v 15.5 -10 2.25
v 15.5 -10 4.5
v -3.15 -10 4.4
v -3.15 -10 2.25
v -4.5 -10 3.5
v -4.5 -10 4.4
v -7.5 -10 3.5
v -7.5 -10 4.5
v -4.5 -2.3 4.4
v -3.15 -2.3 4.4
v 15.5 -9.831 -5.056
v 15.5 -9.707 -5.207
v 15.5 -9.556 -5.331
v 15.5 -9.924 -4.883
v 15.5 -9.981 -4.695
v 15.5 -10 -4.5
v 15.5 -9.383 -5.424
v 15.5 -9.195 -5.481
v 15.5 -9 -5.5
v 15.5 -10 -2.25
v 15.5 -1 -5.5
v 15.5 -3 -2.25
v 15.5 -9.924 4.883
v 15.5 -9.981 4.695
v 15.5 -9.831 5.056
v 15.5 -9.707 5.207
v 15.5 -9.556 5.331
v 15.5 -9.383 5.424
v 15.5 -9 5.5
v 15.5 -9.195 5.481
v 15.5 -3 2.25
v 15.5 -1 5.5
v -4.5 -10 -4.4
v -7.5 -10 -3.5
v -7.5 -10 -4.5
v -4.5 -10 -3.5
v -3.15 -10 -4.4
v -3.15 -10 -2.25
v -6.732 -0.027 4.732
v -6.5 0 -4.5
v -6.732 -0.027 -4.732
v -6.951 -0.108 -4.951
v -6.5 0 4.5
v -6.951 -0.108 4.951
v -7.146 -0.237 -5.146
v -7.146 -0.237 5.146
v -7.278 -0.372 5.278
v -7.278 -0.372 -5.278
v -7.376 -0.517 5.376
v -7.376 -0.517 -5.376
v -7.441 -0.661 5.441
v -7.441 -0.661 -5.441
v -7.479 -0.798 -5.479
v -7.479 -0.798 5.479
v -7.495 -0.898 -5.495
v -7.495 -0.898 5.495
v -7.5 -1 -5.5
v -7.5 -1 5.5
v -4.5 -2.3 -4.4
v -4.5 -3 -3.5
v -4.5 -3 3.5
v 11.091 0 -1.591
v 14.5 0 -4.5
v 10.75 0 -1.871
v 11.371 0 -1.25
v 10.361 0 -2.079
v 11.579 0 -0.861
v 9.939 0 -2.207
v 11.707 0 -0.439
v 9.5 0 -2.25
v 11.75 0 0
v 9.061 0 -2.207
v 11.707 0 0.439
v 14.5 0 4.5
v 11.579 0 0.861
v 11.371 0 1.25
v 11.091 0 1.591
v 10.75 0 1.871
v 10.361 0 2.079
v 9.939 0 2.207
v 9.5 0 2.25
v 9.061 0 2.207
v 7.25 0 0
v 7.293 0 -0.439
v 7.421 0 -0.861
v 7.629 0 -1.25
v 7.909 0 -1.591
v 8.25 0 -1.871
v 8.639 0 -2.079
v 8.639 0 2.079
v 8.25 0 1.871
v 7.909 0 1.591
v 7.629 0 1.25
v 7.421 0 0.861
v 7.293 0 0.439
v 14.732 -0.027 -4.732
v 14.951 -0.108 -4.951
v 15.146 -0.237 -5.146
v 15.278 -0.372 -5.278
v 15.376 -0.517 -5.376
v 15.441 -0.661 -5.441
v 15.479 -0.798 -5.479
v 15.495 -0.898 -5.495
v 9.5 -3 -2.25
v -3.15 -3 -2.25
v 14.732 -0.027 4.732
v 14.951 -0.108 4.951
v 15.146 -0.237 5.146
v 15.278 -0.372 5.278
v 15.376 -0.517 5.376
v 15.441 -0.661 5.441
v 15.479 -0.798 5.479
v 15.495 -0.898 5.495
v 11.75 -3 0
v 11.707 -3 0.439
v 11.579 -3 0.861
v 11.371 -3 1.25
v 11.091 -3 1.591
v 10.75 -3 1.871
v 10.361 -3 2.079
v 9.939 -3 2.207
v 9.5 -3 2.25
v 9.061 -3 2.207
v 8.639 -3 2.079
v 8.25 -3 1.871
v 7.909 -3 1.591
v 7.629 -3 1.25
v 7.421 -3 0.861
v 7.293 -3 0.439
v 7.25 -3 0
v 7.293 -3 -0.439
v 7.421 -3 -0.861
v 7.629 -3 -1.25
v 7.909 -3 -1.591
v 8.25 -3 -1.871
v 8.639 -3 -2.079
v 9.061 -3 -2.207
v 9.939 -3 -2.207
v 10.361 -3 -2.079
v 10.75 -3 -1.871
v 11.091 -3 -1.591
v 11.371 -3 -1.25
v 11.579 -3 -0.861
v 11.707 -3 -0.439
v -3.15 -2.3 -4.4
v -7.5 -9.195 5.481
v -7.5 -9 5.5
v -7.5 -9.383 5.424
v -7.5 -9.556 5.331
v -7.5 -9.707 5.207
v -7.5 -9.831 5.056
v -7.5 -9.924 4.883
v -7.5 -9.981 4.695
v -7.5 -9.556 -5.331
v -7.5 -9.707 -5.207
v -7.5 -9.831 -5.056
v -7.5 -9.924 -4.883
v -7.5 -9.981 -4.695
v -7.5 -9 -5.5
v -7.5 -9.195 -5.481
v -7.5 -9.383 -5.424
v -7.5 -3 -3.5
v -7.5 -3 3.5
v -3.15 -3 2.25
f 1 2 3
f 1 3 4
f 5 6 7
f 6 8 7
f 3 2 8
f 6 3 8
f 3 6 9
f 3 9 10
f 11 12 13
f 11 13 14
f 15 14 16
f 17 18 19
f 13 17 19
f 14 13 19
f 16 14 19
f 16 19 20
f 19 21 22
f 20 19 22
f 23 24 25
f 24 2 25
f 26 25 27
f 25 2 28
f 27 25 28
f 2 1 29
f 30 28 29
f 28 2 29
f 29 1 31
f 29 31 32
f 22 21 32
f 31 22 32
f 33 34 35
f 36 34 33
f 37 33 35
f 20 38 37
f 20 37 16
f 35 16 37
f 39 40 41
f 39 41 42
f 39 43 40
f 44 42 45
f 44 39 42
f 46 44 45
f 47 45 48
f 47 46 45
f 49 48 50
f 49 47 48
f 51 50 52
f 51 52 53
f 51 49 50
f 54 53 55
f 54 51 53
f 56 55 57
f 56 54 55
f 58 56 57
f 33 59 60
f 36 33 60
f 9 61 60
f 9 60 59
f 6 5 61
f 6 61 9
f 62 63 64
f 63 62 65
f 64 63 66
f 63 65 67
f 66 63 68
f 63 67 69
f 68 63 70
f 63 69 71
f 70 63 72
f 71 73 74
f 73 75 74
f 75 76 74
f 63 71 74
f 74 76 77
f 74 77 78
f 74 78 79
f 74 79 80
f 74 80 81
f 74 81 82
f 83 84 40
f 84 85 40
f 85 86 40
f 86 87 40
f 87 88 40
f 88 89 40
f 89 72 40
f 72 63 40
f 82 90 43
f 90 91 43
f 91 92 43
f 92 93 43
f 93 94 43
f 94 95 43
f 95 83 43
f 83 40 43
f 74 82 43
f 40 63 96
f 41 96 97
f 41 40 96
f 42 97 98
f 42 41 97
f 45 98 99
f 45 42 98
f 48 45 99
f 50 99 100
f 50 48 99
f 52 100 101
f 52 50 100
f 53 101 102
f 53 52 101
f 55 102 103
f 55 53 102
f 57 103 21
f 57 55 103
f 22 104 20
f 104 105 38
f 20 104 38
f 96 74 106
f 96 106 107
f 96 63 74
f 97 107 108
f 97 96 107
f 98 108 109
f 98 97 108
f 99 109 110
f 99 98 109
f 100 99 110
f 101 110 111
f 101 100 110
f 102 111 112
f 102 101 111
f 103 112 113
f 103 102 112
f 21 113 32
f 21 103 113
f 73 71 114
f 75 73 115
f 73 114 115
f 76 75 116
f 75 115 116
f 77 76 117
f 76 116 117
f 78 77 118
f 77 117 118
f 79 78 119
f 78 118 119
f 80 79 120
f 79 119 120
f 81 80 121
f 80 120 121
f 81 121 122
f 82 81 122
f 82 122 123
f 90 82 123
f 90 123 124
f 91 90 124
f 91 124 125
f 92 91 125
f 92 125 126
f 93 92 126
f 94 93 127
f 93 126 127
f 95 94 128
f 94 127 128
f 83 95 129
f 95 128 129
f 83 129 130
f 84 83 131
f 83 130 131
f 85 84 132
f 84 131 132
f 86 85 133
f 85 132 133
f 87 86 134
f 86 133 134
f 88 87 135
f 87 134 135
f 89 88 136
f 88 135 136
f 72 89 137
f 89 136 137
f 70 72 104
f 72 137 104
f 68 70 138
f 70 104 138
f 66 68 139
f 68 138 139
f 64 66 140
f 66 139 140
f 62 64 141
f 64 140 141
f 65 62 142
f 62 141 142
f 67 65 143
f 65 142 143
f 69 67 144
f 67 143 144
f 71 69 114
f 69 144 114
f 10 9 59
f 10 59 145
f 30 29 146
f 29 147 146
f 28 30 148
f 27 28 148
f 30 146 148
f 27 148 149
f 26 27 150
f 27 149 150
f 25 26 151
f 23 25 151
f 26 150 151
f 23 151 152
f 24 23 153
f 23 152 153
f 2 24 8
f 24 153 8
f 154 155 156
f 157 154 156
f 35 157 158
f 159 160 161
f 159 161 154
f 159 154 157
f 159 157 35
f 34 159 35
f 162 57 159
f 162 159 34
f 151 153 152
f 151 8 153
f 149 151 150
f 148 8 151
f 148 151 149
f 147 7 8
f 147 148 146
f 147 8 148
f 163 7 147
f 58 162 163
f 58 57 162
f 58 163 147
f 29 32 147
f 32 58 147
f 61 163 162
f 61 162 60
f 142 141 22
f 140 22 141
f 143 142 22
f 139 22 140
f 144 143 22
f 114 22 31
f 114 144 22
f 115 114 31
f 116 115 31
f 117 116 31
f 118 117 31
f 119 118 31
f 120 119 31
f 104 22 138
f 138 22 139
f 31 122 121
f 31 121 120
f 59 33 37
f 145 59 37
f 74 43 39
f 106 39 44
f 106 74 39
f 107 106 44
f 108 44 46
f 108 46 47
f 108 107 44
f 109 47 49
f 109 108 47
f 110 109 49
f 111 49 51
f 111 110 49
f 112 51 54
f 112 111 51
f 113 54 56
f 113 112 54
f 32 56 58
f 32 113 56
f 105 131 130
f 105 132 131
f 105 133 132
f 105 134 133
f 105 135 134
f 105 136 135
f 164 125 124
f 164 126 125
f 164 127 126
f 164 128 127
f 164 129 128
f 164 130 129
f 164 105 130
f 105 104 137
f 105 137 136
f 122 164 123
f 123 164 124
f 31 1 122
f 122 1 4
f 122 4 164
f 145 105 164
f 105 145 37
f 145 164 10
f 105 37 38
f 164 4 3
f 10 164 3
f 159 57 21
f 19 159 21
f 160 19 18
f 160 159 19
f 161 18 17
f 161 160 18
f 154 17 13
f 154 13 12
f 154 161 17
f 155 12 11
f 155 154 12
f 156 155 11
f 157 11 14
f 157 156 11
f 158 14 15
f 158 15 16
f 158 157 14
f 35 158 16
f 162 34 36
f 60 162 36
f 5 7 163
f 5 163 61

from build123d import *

# Parameters (mm, degrees)
F0_W      = 15
F0_H      = 11
F1_DEPTH  = 10
F2_W      = 15
F2_H      = 4.5
F3_DEPTH  = 7
F4_W      = 3
F4_H      = 7
F5_DEPTH  = 7
F6_W      = 1.35
F6_H      = 8.8
F7_DEPTH  = 7.7
F9_DEPTH  = 8
F10_DEPTH = 8
F11_R     = 1
F12_R     = 1
F13_R     = 2.25
F14_DEPTH = 25


with BuildPart() as f1:
    # F0 (on Front) → F1 (new body)
    with BuildSketch(Plane.XZ):
        Rectangle(F0_W, F0_H)
    extrude(amount=F1_DEPTH)

    # F2 (on face) → F3 (cut)
    with BuildSketch(Plane.XZ.offset(10)):
        Rectangle(F2_W, F2_H)
    extrude(amount=-F3_DEPTH, mode=Mode.SUBTRACT)

    # F4 (on face) → F5 (cut)
    with BuildSketch(Plane.XZ.offset(10)):
        with Locations((-6, 0)):
            Rectangle(F4_W, F4_H)
    extrude(amount=-F5_DEPTH, mode=Mode.SUBTRACT)

    # F6 (on face) → F7 (cut)
    with BuildSketch(Plane.XZ.offset(10)):
        with Locations((-3.825, 0)):
            Rectangle(F6_W, F6_H)
    extrude(amount=-F7_DEPTH, mode=Mode.SUBTRACT)

    # F8 (on face) → F9 (join)
    with BuildSketch(Plane.YZ.offset(7.5)):
        Polygon((-10, 2.25), (-3, 2.25), (0, 2.25), (0, 5.5), (-10, 5.5), align=None)
        Polygon((0, -2.25), (-3, -2.25), (-10, -2.25), (-10, -5.5), (0, -5.5), align=None)
    extrude(amount=F9_DEPTH)

    # F10 (add): a face of the model
    f10_faces = [f1.faces().sort_by_distance(p)[0] for p in [
        (7.5, -1.5, 0),
    ]]
    extrude(f10_faces, amount=F10_DEPTH)

    # F11
    f11_edges = [f1.edges().sort_by_distance(p)[0] for p in [
        (-7.5, 0, 0),
        (4, 0, -5.5),
        (15.5, 0, 0),
        (4, 0, 5.5),
    ]]
    fillet(f11_edges, radius=F11_R)

    # F12
    f12_edges = [f1.edges().sort_by_distance(p)[0] for p in [
        (4, -10, 5.5),
        (4, -1, 5.5),
        (4, -10, -5.5),
        (4, -1, -5.5),
    ]]
    fillet(f12_edges, radius=F12_R)

    # F13 (on face) → F14 (cut)
    with BuildSketch(Plane.XZ.offset(3)):
        with Locations((9.5, 0)):
            Circle(F13_R)
    extrude(amount=-F14_DEPTH, mode=Mode.SUBTRACT)


solid = f1.part
